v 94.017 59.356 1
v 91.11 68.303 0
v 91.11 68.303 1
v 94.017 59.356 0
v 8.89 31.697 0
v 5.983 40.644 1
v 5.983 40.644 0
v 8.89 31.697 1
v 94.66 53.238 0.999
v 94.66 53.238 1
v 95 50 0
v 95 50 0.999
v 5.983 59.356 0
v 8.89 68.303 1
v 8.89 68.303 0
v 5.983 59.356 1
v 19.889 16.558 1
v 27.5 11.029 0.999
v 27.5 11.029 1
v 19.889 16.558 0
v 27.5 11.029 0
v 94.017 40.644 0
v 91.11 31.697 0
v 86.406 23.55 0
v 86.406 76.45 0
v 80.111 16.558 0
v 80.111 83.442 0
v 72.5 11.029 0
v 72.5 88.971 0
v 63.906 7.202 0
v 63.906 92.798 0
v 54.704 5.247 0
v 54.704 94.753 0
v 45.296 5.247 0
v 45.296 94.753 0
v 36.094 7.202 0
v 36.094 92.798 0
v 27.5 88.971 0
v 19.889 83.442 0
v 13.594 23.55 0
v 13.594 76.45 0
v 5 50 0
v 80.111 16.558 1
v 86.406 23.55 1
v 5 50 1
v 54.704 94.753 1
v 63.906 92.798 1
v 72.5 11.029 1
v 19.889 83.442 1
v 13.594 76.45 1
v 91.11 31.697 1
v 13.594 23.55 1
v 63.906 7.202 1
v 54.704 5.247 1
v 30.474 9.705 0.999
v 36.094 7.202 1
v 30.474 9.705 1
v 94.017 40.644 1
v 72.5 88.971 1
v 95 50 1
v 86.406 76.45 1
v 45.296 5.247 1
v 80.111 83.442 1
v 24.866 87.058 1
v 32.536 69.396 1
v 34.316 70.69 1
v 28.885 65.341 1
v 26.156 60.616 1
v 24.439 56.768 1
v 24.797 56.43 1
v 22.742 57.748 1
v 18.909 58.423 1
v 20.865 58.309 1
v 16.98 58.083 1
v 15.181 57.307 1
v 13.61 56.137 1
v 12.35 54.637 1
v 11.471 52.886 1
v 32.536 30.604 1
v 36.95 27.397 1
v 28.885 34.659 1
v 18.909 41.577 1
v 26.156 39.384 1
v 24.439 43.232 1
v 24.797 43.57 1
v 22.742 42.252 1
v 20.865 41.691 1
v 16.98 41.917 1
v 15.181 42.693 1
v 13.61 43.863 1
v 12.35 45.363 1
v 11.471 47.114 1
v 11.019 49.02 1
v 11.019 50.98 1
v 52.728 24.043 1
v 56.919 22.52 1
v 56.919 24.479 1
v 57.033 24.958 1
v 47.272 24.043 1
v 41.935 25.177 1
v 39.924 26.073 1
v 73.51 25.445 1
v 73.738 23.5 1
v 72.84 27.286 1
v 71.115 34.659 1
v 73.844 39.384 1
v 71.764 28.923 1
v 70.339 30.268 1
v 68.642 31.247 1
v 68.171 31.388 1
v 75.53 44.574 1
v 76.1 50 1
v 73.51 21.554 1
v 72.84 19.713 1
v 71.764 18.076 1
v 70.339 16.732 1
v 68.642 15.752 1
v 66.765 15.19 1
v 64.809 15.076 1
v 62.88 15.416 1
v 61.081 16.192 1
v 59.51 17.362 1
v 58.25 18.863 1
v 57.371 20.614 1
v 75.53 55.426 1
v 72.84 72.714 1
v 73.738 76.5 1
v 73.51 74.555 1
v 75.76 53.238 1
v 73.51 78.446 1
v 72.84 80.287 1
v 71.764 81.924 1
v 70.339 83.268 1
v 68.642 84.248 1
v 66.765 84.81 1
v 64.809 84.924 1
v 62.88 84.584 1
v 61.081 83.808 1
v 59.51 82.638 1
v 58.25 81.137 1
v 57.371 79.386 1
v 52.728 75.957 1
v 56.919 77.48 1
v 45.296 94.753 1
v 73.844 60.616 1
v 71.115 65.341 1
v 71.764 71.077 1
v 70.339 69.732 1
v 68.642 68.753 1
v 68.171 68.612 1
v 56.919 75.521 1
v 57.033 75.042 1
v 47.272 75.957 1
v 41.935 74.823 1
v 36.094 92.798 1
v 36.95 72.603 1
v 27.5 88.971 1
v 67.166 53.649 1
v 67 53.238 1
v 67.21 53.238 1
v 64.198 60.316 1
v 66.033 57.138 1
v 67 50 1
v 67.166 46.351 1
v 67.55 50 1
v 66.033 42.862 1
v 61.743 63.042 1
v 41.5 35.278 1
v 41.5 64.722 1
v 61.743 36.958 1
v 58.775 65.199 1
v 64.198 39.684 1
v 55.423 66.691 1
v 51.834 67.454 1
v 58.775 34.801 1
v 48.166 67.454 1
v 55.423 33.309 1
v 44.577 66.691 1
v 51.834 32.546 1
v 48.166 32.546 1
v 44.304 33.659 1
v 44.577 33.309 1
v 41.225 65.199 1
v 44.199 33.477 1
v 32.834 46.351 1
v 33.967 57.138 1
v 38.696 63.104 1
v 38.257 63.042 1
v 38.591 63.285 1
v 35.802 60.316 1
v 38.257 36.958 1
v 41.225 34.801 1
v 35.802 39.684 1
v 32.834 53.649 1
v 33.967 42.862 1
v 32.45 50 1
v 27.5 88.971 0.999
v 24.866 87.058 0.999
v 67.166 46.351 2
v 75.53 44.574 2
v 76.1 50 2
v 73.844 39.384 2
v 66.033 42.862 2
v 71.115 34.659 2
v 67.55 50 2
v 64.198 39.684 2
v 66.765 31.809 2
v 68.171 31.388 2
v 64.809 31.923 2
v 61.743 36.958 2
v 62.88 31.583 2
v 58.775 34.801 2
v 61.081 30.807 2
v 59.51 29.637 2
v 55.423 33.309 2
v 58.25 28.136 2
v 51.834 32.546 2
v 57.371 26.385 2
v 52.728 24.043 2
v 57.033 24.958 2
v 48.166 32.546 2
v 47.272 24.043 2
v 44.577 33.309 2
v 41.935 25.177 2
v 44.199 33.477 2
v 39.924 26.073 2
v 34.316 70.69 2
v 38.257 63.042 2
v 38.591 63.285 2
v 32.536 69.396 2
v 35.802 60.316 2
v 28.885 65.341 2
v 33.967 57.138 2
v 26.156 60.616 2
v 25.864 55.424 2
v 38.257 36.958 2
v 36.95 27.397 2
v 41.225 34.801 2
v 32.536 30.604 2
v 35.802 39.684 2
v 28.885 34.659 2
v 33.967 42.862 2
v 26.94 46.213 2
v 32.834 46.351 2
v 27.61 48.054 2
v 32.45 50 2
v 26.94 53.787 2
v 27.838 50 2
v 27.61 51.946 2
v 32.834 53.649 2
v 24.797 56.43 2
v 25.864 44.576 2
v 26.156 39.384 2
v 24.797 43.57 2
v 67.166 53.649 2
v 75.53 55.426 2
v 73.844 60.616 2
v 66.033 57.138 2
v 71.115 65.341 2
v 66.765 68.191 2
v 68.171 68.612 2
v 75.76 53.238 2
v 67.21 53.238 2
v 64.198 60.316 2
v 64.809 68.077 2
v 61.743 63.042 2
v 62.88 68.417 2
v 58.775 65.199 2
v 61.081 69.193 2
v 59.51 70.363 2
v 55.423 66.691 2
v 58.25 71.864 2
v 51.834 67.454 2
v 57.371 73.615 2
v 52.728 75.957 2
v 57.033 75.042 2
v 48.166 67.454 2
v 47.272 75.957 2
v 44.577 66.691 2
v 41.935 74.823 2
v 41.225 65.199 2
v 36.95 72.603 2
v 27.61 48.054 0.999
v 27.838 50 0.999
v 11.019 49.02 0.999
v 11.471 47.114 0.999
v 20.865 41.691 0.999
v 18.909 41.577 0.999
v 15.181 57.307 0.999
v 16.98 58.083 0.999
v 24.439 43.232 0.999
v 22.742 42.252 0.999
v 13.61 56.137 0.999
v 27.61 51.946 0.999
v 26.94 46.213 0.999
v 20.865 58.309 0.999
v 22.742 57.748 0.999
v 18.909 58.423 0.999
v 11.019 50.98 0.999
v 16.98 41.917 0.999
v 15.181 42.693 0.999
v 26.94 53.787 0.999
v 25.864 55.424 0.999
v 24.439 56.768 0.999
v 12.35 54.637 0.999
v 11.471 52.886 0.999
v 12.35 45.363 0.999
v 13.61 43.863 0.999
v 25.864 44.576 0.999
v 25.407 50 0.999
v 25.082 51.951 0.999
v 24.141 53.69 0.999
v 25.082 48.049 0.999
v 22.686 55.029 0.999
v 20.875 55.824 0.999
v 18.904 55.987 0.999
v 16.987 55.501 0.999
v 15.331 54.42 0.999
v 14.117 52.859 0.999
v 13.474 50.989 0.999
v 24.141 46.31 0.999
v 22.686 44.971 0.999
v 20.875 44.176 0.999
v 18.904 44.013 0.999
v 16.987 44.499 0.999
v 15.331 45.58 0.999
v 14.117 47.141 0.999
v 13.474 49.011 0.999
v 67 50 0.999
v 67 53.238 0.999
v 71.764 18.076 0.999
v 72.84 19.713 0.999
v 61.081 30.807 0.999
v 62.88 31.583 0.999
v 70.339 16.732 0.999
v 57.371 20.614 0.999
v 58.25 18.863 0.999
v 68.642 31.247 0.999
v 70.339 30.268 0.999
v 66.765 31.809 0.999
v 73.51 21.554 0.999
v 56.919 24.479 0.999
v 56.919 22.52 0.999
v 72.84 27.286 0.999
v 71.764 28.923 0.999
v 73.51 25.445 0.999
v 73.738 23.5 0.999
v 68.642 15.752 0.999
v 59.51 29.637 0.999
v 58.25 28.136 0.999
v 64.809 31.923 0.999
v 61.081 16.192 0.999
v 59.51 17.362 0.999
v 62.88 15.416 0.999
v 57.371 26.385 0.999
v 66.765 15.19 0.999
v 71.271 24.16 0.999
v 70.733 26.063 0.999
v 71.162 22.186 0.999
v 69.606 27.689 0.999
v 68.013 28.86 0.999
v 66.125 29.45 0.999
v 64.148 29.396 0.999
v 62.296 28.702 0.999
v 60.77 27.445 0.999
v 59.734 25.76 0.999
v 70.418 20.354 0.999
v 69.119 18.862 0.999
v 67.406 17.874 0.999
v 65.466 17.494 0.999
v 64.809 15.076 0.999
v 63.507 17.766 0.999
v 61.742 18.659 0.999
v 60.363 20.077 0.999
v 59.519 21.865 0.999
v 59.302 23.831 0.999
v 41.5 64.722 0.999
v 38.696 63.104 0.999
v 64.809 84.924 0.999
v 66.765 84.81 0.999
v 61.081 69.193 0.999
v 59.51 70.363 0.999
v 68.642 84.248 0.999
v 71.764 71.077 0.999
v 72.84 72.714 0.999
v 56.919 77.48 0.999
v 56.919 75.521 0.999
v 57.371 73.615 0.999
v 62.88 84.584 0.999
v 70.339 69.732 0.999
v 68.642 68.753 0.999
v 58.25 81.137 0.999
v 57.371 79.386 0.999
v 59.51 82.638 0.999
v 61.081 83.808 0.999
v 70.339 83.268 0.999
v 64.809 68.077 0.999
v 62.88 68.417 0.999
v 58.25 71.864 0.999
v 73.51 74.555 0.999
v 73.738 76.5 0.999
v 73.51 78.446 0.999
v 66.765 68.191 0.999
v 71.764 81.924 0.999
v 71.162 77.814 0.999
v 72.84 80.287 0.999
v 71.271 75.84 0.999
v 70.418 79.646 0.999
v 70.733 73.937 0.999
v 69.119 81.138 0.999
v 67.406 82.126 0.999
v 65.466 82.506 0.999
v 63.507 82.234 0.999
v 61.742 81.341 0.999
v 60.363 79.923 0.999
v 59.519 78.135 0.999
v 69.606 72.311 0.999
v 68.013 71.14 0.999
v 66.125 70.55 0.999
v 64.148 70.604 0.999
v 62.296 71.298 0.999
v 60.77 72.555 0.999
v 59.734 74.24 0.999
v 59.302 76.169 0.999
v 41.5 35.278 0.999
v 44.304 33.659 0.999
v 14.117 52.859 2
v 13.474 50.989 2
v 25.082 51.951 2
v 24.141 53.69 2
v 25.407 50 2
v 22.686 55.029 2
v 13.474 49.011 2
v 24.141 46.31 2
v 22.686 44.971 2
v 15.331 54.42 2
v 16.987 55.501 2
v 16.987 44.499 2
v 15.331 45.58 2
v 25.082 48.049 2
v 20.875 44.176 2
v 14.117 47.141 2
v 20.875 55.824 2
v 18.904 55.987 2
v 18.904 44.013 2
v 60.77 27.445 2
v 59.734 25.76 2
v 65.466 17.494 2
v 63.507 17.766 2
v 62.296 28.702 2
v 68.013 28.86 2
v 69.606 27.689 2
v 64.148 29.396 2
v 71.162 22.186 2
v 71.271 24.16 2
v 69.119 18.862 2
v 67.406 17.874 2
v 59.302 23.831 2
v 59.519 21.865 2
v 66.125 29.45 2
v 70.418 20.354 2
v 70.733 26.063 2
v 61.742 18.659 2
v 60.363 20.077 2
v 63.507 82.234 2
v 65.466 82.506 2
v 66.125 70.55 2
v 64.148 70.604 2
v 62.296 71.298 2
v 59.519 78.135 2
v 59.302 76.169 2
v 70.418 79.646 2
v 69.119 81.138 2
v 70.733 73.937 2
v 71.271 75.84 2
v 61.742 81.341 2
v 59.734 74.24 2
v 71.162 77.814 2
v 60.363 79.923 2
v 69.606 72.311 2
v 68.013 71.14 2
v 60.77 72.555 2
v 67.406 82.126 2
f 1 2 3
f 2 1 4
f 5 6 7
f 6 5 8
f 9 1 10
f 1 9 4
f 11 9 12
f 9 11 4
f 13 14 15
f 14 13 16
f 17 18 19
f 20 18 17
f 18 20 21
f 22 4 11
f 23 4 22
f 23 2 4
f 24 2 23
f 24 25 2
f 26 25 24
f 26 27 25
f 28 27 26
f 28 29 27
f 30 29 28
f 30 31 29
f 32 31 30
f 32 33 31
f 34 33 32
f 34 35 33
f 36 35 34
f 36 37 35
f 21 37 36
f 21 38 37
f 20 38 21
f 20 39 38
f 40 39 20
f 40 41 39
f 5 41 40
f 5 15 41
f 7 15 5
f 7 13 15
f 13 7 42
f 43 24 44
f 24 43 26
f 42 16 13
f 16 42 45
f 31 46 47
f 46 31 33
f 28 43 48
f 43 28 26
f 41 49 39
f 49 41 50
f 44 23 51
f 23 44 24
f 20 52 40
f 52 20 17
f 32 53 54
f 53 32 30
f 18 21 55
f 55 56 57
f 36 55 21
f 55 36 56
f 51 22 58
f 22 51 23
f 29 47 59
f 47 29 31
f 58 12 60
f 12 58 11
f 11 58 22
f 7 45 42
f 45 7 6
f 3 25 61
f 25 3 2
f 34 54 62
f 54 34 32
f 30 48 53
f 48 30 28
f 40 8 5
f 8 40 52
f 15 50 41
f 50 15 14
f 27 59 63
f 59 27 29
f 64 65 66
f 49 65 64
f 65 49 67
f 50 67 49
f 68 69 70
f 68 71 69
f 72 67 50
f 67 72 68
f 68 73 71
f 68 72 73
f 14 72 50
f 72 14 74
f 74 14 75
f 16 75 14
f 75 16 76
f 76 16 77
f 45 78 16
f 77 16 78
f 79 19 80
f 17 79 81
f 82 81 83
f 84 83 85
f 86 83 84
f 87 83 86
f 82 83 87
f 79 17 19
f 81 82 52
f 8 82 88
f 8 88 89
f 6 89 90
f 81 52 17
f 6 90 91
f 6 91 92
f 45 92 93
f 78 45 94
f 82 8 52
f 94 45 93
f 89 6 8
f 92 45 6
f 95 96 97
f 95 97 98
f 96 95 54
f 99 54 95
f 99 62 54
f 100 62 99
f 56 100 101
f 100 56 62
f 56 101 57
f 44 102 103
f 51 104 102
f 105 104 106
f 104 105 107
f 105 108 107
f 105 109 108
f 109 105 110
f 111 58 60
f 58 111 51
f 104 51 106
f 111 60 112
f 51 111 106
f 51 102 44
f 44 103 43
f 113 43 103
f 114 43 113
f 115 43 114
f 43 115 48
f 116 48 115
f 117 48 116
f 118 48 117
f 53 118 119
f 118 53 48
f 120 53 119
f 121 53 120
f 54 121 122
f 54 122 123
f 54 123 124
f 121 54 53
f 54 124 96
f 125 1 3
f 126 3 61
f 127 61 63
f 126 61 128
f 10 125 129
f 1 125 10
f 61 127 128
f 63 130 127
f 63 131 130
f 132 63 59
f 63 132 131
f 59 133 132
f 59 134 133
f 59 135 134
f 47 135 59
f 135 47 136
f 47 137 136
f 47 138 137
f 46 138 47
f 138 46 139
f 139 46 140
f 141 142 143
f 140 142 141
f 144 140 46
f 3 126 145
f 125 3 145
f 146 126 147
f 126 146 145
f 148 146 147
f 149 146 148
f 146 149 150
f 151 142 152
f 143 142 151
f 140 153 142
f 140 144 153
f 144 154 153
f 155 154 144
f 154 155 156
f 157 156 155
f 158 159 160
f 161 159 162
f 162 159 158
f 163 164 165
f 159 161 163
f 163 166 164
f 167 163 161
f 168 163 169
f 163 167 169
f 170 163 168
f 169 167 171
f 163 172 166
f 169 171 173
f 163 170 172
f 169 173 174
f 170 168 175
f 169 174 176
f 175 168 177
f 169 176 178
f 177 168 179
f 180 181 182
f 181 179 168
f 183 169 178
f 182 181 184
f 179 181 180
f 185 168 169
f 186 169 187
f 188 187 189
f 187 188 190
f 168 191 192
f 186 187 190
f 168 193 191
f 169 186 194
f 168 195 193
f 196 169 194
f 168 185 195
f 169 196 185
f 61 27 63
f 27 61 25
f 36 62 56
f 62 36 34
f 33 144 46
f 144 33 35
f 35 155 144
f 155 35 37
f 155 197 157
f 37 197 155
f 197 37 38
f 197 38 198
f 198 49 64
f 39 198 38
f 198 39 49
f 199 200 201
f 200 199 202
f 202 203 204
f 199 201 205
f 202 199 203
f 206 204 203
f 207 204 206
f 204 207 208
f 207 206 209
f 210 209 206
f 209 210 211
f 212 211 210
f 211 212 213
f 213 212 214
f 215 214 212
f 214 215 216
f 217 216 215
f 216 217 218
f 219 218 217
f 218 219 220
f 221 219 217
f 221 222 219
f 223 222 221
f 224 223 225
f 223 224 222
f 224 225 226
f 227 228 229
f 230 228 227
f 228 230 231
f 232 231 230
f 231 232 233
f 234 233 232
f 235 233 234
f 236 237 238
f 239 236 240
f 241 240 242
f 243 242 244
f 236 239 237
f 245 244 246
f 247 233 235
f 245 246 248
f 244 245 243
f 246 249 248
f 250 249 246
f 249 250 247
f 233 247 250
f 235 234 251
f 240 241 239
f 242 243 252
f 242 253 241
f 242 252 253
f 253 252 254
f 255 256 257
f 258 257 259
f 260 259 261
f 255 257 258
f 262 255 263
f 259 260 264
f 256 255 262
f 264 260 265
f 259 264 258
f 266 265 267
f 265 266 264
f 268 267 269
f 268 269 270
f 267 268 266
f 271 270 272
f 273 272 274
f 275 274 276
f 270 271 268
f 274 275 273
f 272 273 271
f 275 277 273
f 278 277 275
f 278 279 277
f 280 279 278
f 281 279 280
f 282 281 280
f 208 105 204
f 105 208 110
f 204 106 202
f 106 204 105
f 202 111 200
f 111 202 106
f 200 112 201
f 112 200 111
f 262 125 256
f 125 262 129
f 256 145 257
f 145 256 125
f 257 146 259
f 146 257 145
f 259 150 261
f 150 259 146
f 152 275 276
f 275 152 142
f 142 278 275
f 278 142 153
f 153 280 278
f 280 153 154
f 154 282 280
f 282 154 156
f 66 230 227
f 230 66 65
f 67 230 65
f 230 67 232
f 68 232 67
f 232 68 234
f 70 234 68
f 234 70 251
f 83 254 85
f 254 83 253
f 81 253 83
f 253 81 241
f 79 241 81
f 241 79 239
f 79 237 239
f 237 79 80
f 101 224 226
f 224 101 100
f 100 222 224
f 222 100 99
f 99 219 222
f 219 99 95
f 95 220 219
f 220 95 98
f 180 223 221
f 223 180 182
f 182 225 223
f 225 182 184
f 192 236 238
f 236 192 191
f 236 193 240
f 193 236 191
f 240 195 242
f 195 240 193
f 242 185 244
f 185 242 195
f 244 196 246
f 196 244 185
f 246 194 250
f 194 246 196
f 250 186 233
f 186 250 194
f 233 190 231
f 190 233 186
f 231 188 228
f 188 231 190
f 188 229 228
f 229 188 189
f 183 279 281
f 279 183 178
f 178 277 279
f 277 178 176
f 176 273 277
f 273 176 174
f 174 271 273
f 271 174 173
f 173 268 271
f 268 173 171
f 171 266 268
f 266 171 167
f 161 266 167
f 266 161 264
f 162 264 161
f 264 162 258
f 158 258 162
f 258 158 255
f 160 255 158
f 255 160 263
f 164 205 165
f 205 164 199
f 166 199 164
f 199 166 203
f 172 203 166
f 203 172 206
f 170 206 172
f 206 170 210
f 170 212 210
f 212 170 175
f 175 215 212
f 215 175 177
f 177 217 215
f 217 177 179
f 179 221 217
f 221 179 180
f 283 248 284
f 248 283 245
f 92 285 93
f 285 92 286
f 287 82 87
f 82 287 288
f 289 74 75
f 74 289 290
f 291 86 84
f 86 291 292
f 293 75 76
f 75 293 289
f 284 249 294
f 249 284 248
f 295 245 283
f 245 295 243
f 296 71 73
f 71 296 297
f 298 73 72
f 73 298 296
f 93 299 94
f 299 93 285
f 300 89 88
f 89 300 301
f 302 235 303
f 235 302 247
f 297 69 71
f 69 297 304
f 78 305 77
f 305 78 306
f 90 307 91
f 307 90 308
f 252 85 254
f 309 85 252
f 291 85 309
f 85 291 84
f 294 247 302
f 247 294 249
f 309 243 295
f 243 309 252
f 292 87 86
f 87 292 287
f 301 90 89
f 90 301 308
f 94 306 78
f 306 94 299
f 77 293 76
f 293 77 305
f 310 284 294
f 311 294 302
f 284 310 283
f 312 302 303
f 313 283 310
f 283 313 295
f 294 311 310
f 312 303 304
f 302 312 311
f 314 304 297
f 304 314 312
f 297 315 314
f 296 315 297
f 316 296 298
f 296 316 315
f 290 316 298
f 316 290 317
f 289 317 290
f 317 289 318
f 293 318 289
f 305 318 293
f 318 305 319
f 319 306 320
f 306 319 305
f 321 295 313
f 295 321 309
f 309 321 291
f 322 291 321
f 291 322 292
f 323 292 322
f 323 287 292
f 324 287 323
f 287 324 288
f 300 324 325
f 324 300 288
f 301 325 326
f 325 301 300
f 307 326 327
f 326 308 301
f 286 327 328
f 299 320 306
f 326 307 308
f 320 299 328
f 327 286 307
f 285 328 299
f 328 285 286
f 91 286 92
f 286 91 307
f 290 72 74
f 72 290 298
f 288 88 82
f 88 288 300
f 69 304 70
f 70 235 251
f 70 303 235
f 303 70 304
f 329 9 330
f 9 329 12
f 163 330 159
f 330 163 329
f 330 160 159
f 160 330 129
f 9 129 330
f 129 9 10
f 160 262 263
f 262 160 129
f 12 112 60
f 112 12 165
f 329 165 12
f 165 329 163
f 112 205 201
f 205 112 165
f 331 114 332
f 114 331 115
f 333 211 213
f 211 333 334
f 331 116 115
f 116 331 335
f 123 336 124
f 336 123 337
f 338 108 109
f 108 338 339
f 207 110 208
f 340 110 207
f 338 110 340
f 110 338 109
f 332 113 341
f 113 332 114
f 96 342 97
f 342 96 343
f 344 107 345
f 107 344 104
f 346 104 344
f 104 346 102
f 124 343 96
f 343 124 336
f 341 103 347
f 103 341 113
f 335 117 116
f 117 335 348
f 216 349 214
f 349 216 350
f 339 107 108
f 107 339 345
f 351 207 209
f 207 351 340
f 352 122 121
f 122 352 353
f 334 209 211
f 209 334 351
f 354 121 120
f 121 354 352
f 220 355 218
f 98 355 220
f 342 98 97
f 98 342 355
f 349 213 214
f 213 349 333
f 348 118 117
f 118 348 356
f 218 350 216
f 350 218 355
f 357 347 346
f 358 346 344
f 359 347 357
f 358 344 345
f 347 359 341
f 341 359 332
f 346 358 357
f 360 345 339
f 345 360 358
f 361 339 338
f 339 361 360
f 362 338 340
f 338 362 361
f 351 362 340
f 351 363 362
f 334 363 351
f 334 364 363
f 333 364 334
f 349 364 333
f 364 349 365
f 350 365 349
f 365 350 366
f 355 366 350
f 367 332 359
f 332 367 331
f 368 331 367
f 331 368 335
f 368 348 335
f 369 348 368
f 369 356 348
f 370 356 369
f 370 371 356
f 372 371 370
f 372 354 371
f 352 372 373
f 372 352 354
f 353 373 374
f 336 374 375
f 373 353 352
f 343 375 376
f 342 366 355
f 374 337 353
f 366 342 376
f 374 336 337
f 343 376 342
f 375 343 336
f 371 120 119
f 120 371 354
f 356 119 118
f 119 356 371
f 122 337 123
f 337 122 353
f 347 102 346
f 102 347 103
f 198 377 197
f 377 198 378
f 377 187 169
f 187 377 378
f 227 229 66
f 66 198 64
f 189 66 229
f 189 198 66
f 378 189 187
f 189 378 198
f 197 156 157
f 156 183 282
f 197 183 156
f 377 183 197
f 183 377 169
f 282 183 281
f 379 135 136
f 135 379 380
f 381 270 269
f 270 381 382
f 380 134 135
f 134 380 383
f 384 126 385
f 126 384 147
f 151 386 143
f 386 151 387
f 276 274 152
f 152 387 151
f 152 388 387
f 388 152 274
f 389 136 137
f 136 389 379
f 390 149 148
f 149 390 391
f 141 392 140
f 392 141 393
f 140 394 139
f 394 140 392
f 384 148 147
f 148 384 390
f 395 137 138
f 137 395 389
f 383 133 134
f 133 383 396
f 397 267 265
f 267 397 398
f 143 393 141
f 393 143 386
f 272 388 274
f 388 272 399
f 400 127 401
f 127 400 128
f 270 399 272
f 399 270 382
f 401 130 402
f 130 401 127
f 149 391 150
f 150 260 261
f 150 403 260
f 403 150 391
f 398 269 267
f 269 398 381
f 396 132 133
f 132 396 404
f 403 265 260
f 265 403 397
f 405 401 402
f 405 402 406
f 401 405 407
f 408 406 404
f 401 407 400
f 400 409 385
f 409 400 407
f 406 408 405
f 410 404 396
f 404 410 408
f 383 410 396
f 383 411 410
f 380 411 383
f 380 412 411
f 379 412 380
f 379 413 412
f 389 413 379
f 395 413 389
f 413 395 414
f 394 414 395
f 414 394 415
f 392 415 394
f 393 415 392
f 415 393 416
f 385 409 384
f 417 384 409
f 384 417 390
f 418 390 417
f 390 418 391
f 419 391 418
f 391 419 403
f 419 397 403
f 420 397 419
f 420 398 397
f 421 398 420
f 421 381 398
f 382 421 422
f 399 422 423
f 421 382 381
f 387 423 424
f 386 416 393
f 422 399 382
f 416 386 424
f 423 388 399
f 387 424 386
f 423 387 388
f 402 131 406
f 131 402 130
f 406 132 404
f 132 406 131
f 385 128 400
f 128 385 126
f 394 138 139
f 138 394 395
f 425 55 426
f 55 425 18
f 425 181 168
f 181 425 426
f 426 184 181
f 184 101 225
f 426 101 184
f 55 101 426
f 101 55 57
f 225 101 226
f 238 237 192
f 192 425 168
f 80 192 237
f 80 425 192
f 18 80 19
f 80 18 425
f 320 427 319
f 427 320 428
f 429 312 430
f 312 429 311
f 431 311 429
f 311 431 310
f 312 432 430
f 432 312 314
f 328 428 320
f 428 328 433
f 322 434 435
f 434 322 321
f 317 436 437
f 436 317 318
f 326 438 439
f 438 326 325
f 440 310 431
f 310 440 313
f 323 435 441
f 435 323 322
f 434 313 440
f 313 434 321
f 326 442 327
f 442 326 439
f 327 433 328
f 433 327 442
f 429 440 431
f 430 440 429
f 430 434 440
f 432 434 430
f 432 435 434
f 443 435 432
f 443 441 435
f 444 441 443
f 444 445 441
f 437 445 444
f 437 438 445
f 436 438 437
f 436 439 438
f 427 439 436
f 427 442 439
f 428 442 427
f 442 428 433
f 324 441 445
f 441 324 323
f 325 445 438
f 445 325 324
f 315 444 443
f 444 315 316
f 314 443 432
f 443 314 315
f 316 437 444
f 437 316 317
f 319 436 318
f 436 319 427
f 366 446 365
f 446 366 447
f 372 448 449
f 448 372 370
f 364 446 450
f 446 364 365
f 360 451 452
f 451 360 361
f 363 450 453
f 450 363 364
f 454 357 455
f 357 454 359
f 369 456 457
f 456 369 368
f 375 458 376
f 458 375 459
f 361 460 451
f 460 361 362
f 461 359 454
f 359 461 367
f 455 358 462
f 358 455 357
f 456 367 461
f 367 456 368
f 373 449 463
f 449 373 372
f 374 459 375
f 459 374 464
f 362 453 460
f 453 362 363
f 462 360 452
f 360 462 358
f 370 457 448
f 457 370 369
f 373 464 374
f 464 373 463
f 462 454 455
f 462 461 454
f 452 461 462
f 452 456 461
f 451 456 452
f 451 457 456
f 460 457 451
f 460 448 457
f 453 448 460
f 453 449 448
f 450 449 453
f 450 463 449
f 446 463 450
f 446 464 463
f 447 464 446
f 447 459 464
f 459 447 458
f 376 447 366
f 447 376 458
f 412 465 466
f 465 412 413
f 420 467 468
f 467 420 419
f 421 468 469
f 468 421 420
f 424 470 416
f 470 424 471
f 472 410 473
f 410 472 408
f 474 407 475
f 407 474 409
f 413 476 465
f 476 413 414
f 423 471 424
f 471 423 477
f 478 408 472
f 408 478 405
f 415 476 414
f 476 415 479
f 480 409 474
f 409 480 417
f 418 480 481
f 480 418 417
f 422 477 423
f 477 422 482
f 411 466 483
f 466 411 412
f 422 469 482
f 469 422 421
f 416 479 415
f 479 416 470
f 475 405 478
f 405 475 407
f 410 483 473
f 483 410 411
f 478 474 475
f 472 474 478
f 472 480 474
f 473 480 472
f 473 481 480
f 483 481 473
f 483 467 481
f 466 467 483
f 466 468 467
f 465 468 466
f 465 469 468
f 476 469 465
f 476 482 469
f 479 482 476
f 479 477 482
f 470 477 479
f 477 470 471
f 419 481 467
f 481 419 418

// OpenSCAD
/* 
The Ubuntu Logo!

This is a literal interpretation based on the reference SVG. To translate color to 3D, we treat orange as having a height of 1, and treat white as having a height of 2.

Reference SVG from Wikimedia Commons:
https://commons.wikimedia.org/wiki/File:UbuntuCoF.svg

The Ubuntu Logo is Canonical IP.
The Canoncial IP Policy is available here (accessed 2023-02-11): https://ubuntu.com/legal/intellectual-property-policy
Your use of Canonical IP is subject to:
 - Your acceptance of this IPRights Policy;
 - Your acknowledgement that Canonical IP is the exclusive property of Canonical and can only be used with Canonical’s permission (which can be revoked at any time); and
 - You taking all reasonable steps to ensure that Canonical IP is used in a manner that does not affect either the validity of such Canonical IP or Canonical’s ownership of Canonical IP in any way; and that you will transfer any goodwill you derive from them to Canonical, if requested.

 ...
 You can use our copyright, patent and design materials in accordance with this IPRights Policy.
 ...
 Ubuntu is built by Canonical and the Ubuntu community. We share access rights owned by Canonical with the Ubuntu community for the purposes of discussion, development and advocacy. We recognise that most of the open source discussion and development areas are for non-commercial purposes and we therefore allow the use of Canonical IP in this context, as long as there is no commercial use and that the Canonical IP is used in accordance with this IPRights Policy.
*/


// <g id="friend">
module friend_white() {
  // <circle fill="#ffffff" cx="19.4" cy="50" r="6.00745"/>
  linear_extrude(2) translate([19.4, 50, 0]) circle(r=6.00745);
}

// <g id="friend">
module friend_orange() {
  // <circle fill="#f47421" cx="19.4" cy="50" r="8.4376"/>
  translate([0, 0, 1 - 0.001]) linear_extrude(1.002) translate([19.4, 50, 0]) circle(r=8.4376);
  // <path stroke="#f47421" stroke-width="3.2378" d="M67,50H77"/>
  translate([0, 0, 1 - 0.001]) linear_extrude(1.002) translate([67, 50, 0]) square([77, 3.2378]);
}

module ubuntu(size, height=2) {
  scale([size/100, size/100, height/2]) {
    difference() {
      union() {
        // <circle fill="#f47421" cy="50" cx="50" r="45"/>
        linear_extrude(1) translate([50, 50, 0]) circle(r=45);

        // <circle fill="none" stroke="#ffffff" stroke-width="8.55" cx="50" cy="50" r="21.825"/>
        linear_extrude(2) {
          translate([50, 50, 0]) difference() {
            circle(r=21.825 + 8.55/2);
            circle(r=21.825 - 8.55/2);
          }
        }
      }

      friend_orange();
      translate([50, 50, 0]) rotate(120) translate([-50, -50, 0]) friend_orange();
      translate([50, 50, 0]) rotate(240) translate([-50, -50, 0]) friend_orange();
    }

    friend_white();
    translate([50, 50, 0]) rotate(120) translate([-50, -50, 0]) friend_white();
    translate([50, 50, 0]) rotate(240) translate([-50, -50, 0]) friend_white();
  }
}

ubuntu(100);
